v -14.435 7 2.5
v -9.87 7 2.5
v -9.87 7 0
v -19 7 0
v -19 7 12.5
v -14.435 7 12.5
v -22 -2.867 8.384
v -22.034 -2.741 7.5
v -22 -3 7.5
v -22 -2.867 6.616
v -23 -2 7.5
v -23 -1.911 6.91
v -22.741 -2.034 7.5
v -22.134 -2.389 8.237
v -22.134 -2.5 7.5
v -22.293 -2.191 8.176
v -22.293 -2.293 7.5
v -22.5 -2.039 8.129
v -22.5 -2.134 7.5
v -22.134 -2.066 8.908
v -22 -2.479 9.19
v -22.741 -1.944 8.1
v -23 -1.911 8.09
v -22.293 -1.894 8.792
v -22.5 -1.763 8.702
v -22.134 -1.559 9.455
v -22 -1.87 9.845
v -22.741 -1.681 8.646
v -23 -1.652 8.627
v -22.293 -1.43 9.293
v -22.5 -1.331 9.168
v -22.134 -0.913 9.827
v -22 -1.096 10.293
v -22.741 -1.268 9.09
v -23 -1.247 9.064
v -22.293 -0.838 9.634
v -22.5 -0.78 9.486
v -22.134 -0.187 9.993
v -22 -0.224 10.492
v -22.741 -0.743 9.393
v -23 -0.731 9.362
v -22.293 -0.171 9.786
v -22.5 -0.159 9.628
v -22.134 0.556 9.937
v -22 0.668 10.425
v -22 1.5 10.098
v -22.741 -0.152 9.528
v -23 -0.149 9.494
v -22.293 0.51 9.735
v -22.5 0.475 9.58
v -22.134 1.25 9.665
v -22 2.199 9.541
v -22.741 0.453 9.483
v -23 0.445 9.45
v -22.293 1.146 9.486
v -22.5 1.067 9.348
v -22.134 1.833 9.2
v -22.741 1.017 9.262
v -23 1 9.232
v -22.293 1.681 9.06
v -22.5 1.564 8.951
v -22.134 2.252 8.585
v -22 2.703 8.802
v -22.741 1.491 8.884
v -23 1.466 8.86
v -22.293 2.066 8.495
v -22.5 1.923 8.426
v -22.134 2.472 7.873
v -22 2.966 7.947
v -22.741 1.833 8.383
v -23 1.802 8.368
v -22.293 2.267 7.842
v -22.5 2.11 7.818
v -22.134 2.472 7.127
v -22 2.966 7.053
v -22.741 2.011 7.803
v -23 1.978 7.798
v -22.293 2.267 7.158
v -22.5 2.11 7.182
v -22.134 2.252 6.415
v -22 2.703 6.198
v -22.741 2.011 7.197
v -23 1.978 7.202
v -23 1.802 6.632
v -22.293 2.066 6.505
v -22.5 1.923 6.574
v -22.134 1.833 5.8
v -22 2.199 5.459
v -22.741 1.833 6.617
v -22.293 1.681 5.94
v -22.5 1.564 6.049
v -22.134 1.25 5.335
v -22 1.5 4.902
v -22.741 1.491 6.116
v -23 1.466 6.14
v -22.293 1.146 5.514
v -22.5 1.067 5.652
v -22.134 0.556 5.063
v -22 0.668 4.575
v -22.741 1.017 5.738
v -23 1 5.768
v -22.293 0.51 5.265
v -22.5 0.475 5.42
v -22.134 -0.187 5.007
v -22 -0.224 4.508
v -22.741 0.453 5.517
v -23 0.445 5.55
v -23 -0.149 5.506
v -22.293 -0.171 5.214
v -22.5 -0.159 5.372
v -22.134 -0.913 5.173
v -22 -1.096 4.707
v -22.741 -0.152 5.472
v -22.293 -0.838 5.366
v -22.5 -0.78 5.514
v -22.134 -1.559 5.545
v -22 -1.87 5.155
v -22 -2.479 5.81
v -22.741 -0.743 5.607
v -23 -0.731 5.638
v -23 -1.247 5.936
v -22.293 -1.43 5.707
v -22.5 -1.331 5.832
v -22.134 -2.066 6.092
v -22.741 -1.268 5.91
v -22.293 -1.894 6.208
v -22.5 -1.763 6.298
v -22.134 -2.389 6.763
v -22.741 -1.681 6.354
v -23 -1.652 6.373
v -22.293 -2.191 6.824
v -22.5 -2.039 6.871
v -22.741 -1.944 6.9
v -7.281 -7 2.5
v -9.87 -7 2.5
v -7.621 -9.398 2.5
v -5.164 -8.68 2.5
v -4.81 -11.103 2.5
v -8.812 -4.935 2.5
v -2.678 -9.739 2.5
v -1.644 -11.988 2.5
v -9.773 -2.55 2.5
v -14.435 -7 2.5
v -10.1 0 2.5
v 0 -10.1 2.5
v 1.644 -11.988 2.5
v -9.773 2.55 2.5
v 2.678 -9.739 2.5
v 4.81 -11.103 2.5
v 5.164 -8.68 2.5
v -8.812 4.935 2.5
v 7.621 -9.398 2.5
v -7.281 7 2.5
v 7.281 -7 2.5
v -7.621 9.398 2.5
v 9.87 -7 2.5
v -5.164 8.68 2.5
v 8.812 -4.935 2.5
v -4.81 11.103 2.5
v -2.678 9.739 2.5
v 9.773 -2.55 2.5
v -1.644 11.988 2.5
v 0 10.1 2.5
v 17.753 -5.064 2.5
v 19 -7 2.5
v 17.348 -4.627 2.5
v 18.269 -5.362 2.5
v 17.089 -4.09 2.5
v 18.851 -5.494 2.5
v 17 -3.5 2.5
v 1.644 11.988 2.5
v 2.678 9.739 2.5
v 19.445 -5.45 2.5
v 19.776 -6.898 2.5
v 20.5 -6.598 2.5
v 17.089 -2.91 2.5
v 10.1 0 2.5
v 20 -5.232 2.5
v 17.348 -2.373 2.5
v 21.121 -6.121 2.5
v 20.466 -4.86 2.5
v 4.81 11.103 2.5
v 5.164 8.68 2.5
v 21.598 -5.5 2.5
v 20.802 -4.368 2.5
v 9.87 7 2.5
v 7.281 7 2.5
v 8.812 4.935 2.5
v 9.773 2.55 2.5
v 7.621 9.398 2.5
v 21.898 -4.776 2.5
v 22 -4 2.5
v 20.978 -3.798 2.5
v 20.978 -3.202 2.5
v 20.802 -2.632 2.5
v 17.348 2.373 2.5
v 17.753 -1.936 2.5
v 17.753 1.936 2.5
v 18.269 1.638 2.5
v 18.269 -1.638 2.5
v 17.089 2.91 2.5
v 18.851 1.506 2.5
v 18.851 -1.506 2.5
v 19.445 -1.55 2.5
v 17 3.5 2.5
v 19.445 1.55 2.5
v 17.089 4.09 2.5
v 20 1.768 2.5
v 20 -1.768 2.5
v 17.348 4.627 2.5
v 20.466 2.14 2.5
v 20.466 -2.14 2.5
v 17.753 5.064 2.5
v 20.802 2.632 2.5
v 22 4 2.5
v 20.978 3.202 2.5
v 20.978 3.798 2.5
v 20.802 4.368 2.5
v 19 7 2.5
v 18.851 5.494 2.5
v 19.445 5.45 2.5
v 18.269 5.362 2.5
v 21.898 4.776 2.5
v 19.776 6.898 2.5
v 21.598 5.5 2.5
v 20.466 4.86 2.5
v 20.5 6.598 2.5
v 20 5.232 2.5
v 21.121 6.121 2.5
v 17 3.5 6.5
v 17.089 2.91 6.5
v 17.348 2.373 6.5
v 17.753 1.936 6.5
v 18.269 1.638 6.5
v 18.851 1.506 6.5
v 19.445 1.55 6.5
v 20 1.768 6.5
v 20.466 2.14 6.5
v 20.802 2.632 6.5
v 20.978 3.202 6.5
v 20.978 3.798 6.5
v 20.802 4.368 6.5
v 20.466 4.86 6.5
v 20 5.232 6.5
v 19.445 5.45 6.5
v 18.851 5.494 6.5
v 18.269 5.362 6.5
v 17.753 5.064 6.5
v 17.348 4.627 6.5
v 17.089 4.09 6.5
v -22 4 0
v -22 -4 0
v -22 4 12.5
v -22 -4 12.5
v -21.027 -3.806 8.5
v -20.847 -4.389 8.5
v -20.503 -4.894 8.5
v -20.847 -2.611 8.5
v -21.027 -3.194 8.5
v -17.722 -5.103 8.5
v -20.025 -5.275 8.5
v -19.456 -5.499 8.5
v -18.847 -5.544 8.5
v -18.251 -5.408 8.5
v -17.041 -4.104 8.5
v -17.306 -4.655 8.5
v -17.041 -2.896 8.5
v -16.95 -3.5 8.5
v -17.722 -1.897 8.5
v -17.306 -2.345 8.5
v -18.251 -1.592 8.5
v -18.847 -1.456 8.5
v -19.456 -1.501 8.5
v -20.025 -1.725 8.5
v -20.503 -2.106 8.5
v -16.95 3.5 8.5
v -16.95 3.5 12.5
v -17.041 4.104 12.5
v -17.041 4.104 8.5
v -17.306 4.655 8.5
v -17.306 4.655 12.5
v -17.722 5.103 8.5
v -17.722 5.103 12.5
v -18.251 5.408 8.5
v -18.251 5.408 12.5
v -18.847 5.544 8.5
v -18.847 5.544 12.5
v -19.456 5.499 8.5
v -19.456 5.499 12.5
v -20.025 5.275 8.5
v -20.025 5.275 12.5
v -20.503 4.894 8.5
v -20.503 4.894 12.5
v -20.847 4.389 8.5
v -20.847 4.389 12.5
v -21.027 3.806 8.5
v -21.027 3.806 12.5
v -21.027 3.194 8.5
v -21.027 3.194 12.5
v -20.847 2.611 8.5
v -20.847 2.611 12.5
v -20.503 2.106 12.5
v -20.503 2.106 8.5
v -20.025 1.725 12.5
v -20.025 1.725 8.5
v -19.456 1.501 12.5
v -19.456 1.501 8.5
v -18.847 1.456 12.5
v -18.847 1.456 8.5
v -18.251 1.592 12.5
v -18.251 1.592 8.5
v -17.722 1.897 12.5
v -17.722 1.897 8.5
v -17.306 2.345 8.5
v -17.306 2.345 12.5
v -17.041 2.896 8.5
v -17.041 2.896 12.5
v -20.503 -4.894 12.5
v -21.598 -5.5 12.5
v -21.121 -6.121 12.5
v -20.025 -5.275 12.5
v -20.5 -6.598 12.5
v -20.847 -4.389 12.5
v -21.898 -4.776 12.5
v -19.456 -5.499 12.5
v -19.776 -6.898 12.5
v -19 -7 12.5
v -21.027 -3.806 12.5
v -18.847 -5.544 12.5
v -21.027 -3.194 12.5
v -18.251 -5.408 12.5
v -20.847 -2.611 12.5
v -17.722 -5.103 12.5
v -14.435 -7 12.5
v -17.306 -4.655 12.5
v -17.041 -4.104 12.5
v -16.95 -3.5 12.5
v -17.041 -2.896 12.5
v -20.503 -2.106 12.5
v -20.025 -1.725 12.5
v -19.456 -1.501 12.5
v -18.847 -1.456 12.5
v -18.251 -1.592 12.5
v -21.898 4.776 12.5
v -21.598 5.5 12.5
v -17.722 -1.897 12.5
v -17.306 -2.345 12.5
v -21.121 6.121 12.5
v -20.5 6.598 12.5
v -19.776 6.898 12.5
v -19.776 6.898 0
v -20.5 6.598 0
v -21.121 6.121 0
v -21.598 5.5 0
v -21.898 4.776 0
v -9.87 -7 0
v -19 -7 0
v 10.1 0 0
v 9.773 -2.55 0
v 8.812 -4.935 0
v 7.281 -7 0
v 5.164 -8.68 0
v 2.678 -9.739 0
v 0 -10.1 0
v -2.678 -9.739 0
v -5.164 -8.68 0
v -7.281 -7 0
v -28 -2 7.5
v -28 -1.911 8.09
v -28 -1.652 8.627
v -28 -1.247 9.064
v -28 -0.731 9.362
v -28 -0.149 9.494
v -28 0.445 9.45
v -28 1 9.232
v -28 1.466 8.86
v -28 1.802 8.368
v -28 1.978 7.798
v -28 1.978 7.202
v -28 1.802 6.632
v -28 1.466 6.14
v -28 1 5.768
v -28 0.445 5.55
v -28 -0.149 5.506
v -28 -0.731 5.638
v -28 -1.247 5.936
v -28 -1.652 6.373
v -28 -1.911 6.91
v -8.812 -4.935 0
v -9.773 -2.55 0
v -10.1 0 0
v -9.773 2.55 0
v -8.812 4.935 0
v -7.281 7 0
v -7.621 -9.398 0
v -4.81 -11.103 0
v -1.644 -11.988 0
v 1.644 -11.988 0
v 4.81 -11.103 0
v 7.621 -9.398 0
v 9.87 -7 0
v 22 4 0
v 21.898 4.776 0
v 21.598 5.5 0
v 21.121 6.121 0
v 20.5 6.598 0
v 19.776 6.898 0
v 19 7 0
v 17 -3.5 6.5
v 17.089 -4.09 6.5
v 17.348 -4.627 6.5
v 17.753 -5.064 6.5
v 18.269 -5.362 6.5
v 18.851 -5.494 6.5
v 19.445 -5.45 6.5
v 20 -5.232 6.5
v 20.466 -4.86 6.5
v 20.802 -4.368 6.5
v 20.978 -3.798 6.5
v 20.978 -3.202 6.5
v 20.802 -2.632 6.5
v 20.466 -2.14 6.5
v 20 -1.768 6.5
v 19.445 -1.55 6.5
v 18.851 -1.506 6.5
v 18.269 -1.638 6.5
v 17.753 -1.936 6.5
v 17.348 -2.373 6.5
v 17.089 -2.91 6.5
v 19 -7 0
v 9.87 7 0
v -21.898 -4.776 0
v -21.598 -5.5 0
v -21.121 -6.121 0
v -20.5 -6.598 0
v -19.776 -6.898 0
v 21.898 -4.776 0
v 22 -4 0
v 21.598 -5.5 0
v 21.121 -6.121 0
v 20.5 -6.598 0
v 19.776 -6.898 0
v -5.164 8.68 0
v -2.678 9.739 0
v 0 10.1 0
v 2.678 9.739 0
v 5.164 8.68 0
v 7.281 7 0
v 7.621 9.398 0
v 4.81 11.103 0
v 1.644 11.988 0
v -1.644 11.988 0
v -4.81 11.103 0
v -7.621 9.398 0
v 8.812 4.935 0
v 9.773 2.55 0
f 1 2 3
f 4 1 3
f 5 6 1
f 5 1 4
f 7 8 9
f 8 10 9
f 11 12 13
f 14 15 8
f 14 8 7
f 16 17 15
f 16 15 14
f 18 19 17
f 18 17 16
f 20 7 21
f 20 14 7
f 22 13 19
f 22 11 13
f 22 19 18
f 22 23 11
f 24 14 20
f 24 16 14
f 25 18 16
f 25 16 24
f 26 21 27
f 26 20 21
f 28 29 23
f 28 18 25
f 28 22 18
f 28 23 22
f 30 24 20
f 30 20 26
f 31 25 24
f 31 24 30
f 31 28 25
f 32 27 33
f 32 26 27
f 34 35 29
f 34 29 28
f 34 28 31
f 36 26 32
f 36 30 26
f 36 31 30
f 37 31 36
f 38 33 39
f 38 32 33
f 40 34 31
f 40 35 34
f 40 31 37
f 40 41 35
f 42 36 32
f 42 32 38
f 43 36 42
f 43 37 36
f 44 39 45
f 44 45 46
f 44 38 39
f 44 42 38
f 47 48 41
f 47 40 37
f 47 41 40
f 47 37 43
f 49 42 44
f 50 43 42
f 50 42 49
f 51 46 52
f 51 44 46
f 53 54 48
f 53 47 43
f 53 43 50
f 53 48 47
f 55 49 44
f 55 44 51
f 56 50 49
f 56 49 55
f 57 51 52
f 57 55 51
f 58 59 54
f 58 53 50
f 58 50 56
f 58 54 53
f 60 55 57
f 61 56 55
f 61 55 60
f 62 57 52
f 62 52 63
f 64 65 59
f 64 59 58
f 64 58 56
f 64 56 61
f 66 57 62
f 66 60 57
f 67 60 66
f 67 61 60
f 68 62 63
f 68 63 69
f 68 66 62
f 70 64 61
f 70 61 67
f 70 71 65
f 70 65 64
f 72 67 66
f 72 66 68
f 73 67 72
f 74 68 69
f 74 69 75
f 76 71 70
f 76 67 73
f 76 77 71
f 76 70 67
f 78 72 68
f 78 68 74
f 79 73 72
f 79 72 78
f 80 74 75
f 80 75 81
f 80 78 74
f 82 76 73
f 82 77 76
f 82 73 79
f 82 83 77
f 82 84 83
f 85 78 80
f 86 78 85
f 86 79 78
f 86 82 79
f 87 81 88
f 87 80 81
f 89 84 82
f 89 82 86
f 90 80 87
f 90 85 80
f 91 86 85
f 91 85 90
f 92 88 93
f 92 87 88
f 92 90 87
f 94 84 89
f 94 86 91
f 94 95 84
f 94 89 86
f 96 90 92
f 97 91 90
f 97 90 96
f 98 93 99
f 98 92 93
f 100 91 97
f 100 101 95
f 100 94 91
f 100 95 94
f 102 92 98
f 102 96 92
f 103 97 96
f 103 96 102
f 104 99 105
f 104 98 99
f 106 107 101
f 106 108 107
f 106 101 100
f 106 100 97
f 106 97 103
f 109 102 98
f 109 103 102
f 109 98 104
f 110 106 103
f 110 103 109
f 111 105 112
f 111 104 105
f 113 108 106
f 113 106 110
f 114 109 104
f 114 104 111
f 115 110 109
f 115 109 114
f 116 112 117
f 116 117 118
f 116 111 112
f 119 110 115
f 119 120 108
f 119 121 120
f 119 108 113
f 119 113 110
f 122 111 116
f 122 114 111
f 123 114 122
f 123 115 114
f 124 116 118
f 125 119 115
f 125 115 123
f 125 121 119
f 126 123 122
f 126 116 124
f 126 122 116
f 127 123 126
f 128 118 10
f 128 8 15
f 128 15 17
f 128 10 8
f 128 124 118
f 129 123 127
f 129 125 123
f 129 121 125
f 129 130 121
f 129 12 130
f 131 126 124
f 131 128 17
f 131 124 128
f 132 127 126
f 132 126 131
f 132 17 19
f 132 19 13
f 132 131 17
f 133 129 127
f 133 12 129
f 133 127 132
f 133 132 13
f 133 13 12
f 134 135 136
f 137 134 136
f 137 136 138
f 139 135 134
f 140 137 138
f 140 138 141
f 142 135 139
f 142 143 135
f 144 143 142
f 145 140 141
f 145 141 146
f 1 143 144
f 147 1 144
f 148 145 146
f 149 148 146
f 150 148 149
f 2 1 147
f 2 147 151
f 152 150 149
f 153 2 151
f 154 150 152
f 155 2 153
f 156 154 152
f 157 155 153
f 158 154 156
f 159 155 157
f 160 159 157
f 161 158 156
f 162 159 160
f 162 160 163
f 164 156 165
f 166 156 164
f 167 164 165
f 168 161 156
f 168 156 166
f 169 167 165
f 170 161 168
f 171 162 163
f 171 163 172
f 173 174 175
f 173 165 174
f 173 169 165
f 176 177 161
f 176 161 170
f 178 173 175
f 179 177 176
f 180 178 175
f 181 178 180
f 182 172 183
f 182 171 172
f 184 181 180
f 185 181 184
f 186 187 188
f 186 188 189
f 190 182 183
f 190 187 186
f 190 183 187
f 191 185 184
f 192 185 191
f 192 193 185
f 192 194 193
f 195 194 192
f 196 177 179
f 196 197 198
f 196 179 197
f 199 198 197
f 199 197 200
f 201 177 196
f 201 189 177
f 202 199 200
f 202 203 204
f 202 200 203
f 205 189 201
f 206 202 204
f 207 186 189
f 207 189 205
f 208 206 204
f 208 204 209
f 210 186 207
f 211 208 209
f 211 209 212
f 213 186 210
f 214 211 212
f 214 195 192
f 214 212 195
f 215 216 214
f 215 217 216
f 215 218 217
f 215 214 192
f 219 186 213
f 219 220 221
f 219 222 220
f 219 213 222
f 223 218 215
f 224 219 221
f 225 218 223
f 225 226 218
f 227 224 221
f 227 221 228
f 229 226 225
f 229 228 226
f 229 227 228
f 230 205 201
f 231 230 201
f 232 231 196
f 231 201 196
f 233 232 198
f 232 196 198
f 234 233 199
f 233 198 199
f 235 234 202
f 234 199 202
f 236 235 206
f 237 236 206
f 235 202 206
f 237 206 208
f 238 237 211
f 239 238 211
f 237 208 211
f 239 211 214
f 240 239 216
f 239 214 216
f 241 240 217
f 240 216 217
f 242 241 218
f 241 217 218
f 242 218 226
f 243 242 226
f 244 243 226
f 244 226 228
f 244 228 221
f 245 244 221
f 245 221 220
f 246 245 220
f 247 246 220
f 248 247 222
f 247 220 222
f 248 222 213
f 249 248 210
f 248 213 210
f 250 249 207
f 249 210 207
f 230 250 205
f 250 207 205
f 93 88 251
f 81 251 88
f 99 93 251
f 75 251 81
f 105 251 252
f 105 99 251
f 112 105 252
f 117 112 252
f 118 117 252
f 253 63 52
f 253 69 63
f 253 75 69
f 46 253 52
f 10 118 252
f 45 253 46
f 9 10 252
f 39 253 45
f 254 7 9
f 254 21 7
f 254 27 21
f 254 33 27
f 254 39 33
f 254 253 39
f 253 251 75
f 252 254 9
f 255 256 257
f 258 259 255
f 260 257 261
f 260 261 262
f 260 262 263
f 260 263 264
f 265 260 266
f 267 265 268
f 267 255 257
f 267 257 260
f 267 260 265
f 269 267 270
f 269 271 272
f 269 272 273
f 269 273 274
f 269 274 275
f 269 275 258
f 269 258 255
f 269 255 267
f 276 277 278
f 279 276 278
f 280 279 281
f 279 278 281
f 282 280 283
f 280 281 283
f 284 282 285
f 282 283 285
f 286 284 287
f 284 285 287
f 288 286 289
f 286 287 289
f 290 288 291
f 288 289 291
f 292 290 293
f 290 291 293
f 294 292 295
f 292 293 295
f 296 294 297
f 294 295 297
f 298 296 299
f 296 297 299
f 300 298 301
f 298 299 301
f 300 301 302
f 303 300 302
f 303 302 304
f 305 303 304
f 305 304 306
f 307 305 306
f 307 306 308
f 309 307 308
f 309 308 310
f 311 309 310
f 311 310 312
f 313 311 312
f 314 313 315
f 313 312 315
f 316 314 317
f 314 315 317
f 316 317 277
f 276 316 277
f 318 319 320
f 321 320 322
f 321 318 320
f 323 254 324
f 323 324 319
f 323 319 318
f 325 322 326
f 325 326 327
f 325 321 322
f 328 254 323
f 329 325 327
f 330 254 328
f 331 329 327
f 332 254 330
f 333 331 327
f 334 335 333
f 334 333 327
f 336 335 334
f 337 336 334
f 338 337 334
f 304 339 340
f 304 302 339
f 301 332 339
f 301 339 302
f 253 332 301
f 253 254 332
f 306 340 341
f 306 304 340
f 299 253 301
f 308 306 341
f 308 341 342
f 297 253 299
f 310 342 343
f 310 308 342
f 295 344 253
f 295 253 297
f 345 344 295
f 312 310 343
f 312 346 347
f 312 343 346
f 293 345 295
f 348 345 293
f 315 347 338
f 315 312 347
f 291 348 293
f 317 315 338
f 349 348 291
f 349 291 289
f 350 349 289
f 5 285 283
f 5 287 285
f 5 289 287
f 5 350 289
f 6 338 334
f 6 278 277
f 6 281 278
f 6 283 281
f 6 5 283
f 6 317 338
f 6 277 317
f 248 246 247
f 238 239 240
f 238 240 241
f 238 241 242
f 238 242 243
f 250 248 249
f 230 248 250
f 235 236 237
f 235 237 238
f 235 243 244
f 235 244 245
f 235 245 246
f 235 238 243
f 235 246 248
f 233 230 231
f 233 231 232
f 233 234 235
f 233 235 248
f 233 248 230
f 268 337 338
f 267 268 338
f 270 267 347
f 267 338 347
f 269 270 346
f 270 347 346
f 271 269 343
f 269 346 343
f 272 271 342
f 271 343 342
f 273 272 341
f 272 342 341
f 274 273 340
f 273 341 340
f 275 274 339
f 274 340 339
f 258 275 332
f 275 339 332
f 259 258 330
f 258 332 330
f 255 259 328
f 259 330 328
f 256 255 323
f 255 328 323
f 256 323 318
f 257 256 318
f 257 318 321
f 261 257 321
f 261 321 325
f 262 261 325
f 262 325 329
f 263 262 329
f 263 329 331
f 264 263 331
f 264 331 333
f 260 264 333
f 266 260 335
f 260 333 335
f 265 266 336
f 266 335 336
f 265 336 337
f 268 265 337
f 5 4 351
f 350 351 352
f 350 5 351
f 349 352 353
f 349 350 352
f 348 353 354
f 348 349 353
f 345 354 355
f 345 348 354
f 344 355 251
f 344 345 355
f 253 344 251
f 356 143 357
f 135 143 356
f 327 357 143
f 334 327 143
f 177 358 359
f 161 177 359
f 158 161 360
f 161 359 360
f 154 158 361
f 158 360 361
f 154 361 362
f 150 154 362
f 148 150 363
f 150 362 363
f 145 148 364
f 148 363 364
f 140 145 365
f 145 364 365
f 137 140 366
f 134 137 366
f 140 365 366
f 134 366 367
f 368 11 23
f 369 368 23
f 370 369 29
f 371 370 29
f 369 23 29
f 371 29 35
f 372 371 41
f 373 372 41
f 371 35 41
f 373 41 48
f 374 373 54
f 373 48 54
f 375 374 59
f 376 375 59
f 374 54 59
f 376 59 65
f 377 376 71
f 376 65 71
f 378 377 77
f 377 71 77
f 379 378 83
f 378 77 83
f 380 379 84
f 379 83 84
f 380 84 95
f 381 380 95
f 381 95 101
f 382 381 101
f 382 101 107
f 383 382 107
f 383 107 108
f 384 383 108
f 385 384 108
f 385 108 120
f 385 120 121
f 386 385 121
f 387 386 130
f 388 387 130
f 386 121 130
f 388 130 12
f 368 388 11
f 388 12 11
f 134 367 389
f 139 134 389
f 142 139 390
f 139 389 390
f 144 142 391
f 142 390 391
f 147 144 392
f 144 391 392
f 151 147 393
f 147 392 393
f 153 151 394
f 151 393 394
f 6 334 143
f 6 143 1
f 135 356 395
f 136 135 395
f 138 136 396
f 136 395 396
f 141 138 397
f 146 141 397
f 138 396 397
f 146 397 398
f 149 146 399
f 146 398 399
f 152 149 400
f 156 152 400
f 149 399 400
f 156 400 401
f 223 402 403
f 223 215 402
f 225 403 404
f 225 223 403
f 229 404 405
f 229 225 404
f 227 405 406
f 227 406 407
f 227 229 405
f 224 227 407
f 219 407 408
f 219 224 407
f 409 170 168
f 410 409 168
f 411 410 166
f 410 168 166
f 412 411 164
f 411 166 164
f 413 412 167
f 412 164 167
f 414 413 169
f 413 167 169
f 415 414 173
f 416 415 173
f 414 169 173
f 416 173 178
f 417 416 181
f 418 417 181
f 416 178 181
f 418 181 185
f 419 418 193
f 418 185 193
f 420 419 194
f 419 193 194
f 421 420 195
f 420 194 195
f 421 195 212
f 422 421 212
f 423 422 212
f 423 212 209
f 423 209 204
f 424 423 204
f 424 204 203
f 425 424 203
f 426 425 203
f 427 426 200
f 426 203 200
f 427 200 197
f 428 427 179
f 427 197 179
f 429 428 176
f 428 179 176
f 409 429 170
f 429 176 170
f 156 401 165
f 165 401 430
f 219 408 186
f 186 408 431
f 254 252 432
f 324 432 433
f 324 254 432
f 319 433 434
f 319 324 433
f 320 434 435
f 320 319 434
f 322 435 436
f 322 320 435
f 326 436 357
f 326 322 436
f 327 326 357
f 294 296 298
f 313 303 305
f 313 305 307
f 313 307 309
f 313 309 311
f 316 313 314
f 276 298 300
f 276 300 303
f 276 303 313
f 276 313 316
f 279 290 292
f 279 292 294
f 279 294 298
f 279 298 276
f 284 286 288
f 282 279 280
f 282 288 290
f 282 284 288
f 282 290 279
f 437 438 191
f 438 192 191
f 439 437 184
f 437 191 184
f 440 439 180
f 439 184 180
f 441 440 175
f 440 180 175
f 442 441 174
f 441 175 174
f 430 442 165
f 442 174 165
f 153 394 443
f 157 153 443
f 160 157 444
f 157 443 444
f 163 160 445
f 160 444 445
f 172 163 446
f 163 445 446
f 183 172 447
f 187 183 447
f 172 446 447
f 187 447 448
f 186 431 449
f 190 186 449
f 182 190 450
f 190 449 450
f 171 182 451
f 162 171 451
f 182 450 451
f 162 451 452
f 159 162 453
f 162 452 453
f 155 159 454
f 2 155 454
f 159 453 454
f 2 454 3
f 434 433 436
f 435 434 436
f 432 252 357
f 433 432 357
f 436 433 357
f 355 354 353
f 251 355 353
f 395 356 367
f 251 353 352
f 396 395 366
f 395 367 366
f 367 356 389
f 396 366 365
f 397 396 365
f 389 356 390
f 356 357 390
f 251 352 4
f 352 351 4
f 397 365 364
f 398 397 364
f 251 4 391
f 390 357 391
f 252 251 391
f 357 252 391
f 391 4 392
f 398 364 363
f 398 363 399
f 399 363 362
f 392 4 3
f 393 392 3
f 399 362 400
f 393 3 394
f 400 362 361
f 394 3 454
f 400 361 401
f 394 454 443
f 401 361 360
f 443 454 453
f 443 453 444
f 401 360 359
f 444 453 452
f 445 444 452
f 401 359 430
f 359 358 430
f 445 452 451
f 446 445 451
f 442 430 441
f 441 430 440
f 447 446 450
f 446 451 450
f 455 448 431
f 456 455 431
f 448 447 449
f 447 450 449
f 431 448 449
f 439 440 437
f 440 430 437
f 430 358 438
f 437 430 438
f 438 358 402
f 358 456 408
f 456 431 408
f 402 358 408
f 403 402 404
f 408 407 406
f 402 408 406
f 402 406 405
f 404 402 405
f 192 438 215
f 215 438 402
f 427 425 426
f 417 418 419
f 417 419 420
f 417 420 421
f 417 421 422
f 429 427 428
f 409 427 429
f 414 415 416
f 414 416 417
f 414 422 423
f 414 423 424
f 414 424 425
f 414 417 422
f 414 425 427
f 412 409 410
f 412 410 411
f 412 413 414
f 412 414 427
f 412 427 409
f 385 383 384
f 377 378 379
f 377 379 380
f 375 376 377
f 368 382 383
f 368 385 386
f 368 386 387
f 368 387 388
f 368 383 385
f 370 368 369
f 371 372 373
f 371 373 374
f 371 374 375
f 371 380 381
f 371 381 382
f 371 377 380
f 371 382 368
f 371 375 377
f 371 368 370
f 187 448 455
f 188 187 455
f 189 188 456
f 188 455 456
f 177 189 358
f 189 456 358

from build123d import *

# Parameters (mm, degrees)
EXTRUDE_1_DEPTH     = 2.5
FILLET_1_R          = 3
EXTRUDE_START       = 10
EXTRUDE_2_DEPTH     = 10
SKETCH_3_R          = 2
EXTRUDE_3_DEPTH     = 6
SKETCH_5_R          = 2
EXTRUDE_4_DEPTH     = 4
SKETCH_6_R          = 2.05
CUT_EXTRUDE_1_DEPTH = 4
FILLET_2_R          = 1


with BuildPart() as part:
    # 草图1 → 凸台-拉伸1 (new body)
    with BuildSketch(Plane.XY):
        with BuildLine():
            ThreePointArc((9.86965045, 7), (0, 12.1), (-9.86965045, 7))
            Line((-9.86965045, 7), (-7.28079666, 7))
            ThreePointArc((-7.28079666, 7), (0, 10.1), (7.28079666, 7))
            Line((7.28079666, 7), (9.86965045, 7))
        make_face()
        with BuildLine():
            Line((-22, 7), (-22, -7))
            Line((-22, -7), (-9.86965045, -7))
            ThreePointArc((-9.86965045, -7), (-12.1, 0), (-9.86965045, 7))
            Line((-9.86965045, 7), (-22, 7))
        make_face()
        with BuildLine():
            ThreePointArc((12.1, 0), (11.528936864, -3.673365593), (9.86965045, -7))
            Line((9.86965045, -7), (22, -7))
            Line((22, -7), (22, 7))
            Line((22, 7), (9.86965045, 7))
            ThreePointArc((9.86965045, 7), (11.528936864, 3.673365593), (12.1, 0))
        make_face()
        with BuildLine():
            Line((-7.28079666, -7), (-9.86965045, -7))
            ThreePointArc((-9.86965045, -7), (0, -12.1), (9.86965045, -7))
            Line((9.86965045, -7), (7.28079666, -7))
            ThreePointArc((7.28079666, -7), (0, -10.1), (-7.28079666, -7))
        make_face()
        with BuildLine():
            ThreePointArc((-9.86965045, 7), (-12.1, 0), (-9.86965045, -7))
            Line((-9.86965045, -7), (-7.28079666, -7))
            ThreePointArc((-7.28079666, -7), (-10.1, 0), (-7.28079666, 7))
            Line((-7.28079666, 7), (-9.86965045, 7))
        make_face()
        with BuildLine():
            Line((7.28079666, -7), (9.86965045, -7))
            ThreePointArc((9.86965045, -7), (11.528936864, -3.673365593), (12.1, 0))
            ThreePointArc((12.1, 0), (11.528936864, 3.673365593), (9.86965045, 7))
            Line((9.86965045, 7), (7.28079666, 7))
            ThreePointArc((7.28079666, 7), (9.368725801, 3.773191867), (10.1, 0))
            ThreePointArc((10.1, 0), (9.368725801, -3.773191867), (7.28079666, -7))
        make_face()
        with BuildLine():
            ThreePointArc((-9.86965045, 7), (-12.1, 0), (-9.86965045, -7))
            Line((-9.86965045, -7), (-7.28079666, -7))
            ThreePointArc((-7.28079666, -7), (-10.1, 0), (-7.28079666, 7))
            Line((-7.28079666, 7), (-9.86965045, 7))
        make_face()
        with BuildLine():
            Line((7.28079666, -7), (9.86965045, -7))
            ThreePointArc((9.86965045, -7), (11.528936864, -3.673365593), (12.1, 0))
            ThreePointArc((12.1, 0), (11.528936864, 3.673365593), (9.86965045, 7))
            Line((9.86965045, 7), (7.28079666, 7))
            ThreePointArc((7.28079666, 7), (9.368725801, 3.773191867), (10.1, 0))
            ThreePointArc((10.1, 0), (9.368725801, -3.773191867), (7.28079666, -7))
        make_face()
    extrude(amount=EXTRUDE_1_DEPTH)

    # 圆角1
    fillet_1_edges = [part.edges().sort_by_distance(p)[0] for p in [
        (22, 7, 1.25),
        (22, -7, 1.25),
        (-22, -7, 1.25),
        (-22, 7, 1.25),
    ]]
    fillet(fillet_1_edges, radius=FILLET_1_R)

    # 草图2 → 凸台-拉伸2 (add)
    with BuildSketch(Plane.XY.offset(2.5).offset(EXTRUDE_START)):
        with BuildLine():
            Line((-14.434825225, -7), (-14.434825225, 7))
            Line((-14.434825225, 7), (-19, 7))
            ThreePointArc((-19, 7), (-21.121320344, 6.121320344), (-22, 4))
            Line((-22, 4), (-22, -4))
            ThreePointArc((-22, -4), (-21.121320344, -6.121320344), (-19, -7))
            Line((-19, -7), (-14.434825225, -7))
        make_face()
    extrude(amount=-EXTRUDE_2_DEPTH)

    # 草图3 → 凸台-拉伸3 (add)
    with BuildSketch(Plane.ZY.offset(22)):
        with Locations(Location((7.5, 0, 0), (0, 0, 270))):
            Circle(SKETCH_3_R)
    extrude(amount=EXTRUDE_3_DEPTH)

    # 草图5 → 凸台-拉伸4 (add)
    with BuildSketch(Plane.XY.offset(2.5)):
        with Locations(Location((19, -3.5, 0), (0, 0, 180))):
            Circle(SKETCH_5_R)
        with Locations(Location((19, 3.5, 0), (0, 0, 180))):
            Circle(SKETCH_5_R)
    extrude(amount=EXTRUDE_4_DEPTH)

    # 草图6 → 切除-拉伸1 (cut)
    with BuildSketch(Plane.XY.offset(12.5)):
        with Locations((-19, 3.5)):
            Circle(SKETCH_6_R)
        with Locations((-19, -3.5)):
            Circle(SKETCH_6_R)
    extrude(amount=-CUT_EXTRUDE_1_DEPTH, mode=Mode.SUBTRACT)

    # 圆角2
    fillet_2_edges = [part.edges().sort_by_distance(p)[0] for p in [
        (-22, 2, 7.5),
    ]]
    fillet(fillet_2_edges, radius=FILLET_2_R)


solid = part.part
